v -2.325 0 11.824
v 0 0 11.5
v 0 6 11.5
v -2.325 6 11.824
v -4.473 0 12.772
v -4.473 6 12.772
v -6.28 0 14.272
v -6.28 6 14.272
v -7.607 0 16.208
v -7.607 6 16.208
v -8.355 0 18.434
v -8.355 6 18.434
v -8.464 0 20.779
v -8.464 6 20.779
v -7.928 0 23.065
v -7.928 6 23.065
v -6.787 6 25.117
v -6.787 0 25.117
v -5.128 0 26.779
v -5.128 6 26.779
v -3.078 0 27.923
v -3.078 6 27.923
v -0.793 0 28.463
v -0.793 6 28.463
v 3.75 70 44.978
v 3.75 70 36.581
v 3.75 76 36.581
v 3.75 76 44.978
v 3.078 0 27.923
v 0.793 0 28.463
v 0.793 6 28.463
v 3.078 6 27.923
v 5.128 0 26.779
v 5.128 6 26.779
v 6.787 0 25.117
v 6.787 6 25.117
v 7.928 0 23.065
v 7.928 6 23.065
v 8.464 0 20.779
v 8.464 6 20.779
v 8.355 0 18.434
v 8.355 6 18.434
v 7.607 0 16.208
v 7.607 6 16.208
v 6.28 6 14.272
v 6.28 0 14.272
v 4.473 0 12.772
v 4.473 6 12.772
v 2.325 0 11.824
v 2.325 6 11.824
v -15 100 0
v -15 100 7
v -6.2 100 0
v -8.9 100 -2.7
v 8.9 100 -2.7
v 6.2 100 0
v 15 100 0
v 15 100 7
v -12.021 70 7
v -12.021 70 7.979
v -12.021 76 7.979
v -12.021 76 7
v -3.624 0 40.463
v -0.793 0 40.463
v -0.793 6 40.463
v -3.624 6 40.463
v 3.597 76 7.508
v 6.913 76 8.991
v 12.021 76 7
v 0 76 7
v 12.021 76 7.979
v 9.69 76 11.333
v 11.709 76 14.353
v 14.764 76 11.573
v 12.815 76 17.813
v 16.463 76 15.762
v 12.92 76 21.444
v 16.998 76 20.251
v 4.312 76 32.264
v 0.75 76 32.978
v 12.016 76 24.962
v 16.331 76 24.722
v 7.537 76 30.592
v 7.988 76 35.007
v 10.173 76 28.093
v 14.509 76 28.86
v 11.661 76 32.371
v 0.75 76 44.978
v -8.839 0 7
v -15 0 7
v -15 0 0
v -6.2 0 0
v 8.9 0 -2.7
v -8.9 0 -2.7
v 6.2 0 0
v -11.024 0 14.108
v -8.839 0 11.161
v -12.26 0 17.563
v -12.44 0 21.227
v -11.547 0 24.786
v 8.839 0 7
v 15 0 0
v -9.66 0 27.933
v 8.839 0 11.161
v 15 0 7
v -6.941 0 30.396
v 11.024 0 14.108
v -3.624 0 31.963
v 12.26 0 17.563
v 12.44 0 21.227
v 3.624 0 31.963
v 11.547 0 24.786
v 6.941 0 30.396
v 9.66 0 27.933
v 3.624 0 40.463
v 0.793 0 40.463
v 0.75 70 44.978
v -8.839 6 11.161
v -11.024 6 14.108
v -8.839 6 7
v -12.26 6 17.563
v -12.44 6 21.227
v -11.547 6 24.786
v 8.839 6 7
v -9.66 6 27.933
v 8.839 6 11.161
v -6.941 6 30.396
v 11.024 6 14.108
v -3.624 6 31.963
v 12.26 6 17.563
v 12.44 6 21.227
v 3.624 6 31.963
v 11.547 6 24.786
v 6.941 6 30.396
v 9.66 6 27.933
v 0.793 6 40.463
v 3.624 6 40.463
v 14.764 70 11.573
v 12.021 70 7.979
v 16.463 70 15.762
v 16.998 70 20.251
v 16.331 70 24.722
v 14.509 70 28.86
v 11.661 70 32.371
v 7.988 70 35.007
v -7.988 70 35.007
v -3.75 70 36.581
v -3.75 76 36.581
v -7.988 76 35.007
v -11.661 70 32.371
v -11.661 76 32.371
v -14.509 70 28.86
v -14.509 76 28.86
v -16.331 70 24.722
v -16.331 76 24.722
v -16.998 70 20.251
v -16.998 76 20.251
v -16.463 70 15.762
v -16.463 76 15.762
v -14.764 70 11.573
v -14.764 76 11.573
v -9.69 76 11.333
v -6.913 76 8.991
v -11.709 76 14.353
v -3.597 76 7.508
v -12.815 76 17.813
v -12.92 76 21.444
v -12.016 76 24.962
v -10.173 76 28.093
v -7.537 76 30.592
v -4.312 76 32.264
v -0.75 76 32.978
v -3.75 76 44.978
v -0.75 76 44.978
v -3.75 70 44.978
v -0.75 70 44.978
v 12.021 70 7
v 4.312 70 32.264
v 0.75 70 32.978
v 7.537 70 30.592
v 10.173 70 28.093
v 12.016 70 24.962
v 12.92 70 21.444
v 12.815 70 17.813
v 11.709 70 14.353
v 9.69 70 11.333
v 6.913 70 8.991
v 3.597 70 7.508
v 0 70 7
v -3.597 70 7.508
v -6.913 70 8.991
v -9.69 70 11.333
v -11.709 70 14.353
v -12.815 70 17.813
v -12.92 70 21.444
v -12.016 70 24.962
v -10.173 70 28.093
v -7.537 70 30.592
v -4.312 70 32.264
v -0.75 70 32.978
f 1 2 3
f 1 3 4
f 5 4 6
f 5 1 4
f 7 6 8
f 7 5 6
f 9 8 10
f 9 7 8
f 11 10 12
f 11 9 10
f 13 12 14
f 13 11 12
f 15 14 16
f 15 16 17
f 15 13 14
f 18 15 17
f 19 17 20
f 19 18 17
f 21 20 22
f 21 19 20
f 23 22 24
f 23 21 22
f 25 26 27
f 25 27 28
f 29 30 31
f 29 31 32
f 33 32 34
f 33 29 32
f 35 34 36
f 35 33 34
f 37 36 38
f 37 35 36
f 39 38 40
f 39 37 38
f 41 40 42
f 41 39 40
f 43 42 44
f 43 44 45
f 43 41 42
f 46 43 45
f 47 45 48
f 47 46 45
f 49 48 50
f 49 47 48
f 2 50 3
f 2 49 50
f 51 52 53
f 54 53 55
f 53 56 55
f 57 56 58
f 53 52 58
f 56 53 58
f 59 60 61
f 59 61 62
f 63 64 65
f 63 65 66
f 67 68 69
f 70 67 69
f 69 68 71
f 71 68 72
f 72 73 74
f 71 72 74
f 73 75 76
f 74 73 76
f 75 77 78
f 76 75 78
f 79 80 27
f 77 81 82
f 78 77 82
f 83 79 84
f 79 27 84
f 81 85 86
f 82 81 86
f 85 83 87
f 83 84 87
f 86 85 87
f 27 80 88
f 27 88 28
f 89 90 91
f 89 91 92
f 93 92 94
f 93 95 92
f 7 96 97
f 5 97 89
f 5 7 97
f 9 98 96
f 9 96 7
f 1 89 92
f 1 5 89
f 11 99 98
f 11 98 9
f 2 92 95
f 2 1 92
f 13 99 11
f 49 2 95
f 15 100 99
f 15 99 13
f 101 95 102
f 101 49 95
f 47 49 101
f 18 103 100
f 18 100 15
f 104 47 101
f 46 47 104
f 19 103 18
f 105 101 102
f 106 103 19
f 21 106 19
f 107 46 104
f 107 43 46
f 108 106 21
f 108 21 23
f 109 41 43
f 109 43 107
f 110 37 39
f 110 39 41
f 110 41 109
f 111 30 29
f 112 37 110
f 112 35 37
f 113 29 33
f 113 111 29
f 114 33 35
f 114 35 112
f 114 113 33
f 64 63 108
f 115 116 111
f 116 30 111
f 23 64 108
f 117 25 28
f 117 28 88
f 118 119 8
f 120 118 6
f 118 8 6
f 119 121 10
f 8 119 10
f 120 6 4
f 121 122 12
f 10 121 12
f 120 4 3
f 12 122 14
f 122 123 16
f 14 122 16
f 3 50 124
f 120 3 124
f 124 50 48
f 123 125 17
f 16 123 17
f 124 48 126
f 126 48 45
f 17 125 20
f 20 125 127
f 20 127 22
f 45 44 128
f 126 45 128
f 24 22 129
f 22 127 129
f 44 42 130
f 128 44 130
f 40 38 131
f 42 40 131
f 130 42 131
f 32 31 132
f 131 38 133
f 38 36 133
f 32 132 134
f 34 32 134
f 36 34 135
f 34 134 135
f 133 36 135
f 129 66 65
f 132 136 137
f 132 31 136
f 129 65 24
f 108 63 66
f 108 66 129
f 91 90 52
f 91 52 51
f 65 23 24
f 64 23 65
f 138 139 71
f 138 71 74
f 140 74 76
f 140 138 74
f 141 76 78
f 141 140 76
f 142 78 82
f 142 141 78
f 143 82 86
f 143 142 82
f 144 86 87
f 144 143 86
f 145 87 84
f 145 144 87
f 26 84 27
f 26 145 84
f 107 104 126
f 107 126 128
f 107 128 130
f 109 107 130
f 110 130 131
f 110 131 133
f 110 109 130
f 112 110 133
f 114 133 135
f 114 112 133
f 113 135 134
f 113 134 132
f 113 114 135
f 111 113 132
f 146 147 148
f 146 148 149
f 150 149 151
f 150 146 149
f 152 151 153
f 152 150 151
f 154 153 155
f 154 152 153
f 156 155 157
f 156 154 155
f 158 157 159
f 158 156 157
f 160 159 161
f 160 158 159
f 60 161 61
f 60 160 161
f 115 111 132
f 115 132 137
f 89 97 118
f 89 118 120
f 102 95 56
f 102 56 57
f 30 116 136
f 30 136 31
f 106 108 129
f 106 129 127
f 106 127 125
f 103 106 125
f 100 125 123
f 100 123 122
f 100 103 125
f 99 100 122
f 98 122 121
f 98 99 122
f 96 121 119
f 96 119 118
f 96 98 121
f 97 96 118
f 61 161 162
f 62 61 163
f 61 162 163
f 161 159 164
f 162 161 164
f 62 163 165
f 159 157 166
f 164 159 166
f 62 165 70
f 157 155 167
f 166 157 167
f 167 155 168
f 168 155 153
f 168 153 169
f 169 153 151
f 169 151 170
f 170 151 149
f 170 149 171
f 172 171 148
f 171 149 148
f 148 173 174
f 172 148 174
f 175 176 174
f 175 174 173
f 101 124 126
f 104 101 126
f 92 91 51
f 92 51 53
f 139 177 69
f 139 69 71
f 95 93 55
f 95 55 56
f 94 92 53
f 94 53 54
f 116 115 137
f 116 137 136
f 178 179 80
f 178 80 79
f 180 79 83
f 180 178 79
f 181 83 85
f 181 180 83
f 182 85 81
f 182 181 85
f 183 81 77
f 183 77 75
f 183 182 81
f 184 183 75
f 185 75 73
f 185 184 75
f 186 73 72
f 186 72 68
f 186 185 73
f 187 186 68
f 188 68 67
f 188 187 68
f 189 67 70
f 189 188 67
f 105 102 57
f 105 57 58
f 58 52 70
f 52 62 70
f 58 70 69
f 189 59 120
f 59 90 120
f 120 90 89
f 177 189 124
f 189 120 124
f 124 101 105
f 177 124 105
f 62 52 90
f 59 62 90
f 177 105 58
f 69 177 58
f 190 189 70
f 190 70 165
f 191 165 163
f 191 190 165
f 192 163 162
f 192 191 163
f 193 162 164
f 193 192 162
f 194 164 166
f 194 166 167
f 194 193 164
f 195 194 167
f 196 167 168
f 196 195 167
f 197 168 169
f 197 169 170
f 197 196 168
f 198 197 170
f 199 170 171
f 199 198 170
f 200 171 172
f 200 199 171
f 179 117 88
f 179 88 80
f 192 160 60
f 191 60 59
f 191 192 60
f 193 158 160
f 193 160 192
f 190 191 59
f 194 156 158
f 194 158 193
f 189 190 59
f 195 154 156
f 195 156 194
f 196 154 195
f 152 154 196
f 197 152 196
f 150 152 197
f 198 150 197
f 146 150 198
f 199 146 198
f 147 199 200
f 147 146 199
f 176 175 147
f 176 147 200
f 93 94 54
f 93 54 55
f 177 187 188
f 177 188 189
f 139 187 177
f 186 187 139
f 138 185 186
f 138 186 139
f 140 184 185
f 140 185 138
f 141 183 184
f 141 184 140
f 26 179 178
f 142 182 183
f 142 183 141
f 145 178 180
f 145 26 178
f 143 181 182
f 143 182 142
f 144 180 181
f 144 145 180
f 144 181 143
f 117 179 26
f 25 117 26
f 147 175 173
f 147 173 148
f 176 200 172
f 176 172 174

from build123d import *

# Parameters (mm, degrees)
F2_DEPTH = 100
F3_DEPTH = 76
F4_DEPTH = 70
F5_DEPTH = 6
F7_DEPTH = 12.5


with BuildPart() as f2:
    # F0 (on Front) → F2 (new body)
    with BuildSketch(Plane.XZ):
        Polygon((-6.2, 0), (0, 0), (6.2, 0), (15, 0), (15, 7), (8.8388347648, 7), (0, 7), (-8.8388347648, 7), (-15, 7), (-15, 0), align=None)
        Polygon((0, -2.7), (0, 0), (-6.2, 0), (-8.9, -2.7), align=None)
        Polygon((6.2, 0), (0, 0), (0, -2.7), (8.9, -2.7), align=None)
    extrude(amount=-F2_DEPTH)

    # F1 (on Front) → F3 (join)
    with BuildSketch(Plane.XZ):
        with BuildLine():
            ThreePointArc((0, 7), (-12.9945857106, 19.6248437535), (-0.75, 32.9783473524))
            Line((-0.75, 32.9783473524), (-0.75, 44.9783473524))
            Line((-0.75, 44.9783473524), (-3.75, 44.9783473524))
            Line((-3.75, 44.9783473524), (-3.75, 36.5812393988))
            ThreePointArc((-3.75, 36.5812393988), (-16.3309227117, 24.7223895842), (-12.0208152802, 7.9791847198))
            Line((-12.0208152802, 7.9791847198), (-12.0208152802, 7))
            Line((-12.0208152802, 7), (0, 7))
        make_face()
        with BuildLine():
            ThreePointArc((0.75, 32.9783473524), (12.9945857106, 19.6248437535), (0, 7))
            Line((0, 7), (12.0208152802, 7))
            Line((12.0208152802, 7), (12.0208152802, 7.9791847198))
            ThreePointArc((12.0208152802, 7.9791847198), (16.3309227117, 24.7223895842), (3.75, 36.5812393988))
            Line((3.75, 36.5812393988), (3.75, 44.9783473524))
            Line((3.75, 44.9783473524), (0.75, 44.9783473524))
            Line((0.75, 44.9783473524), (0.75, 32.9783473524))
        make_face()
    extrude(amount=-F3_DEPTH)

    # F1 (on Front) → F4 (cut)
    with BuildSketch(Plane.XZ):
        with BuildLine():
            ThreePointArc((0, 7), (-12.9945857106, 19.6248437535), (-0.75, 32.9783473524))
            Line((-0.75, 32.9783473524), (-0.75, 44.9783473524))
            Line((-0.75, 44.9783473524), (-3.75, 44.9783473524))
            Line((-3.75, 44.9783473524), (-3.75, 36.5812393988))
            ThreePointArc((-3.75, 36.5812393988), (-16.3309227117, 24.7223895842), (-12.0208152802, 7.9791847198))
            Line((-12.0208152802, 7.9791847198), (-12.0208152802, 7))
            Line((-12.0208152802, 7), (0, 7))
        make_face()
        with BuildLine():
            ThreePointArc((0.75, 32.9783473524), (12.9945857106, 19.6248437535), (0, 7))
            Line((0, 7), (12.0208152802, 7))
            Line((12.0208152802, 7), (12.0208152802, 7.9791847198))
            ThreePointArc((12.0208152802, 7.9791847198), (16.3309227117, 24.7223895842), (3.75, 36.5812393988))
            Line((3.75, 36.5812393988), (3.75, 44.9783473524))
            Line((3.75, 44.9783473524), (0.75, 44.9783473524))
            Line((0.75, 44.9783473524), (0.75, 32.9783473524))
        make_face()
    extrude(amount=-F4_DEPTH, mode=Mode.SUBTRACT)

    # F0 (on Front) → F5 (join)
    with BuildSketch(Plane.XZ):
        with BuildLine():
            Line((-8.8388347648, 11.1611652352), (-8.8388347648, 7))
            Line((-8.8388347648, 7), (0, 7))
            Line((0, 7), (0, 11.5))
            ThreePointArc((0, 11.5), (-8.4907228952, 19.602980205), (-0.7931729561, 28.4629118311))
            Line((-0.7931729561, 28.4629118311), (-0.7931729561, 40.4629118311))
            Line((-0.7931729561, 40.4629118311), (-3.624006873, 40.4629118311))
            Line((-3.624006873, 40.4629118311), (-3.624006873, 31.9631339617))
            ThreePointArc((-3.624006873, 31.9631339617), (-12.1248126232, 23.0395589899), (-8.8388347648, 11.1611652352))
        make_face()
        with BuildLine():
            Line((0, 7), (8.8388347648, 7))
            Line((8.8388347648, 7), (8.8388347648, 11.1611652352))
            ThreePointArc((8.8388347648, 11.1611652352), (12.1248126232, 23.0395589899), (3.624006873, 31.9631339617))
            Line((3.624006873, 31.9631339617), (3.624006873, 40.4629118311))
            Line((3.624006873, 40.4629118311), (0.7931729561, 40.4629118311))
            Line((0.7931729561, 40.4629118311), (0.7931729561, 28.4629118311))
            ThreePointArc((0.7931729561, 28.4629118311), (8.4907228952, 19.602980205), (0, 11.5))
            Line((0, 11.5), (0, 7))
        make_face()
    extrude(amount=-F5_DEPTH)

    # F6 (on Right) → F7 (cut, symmetric)
    with BuildSketch(Plane.YZ):
        with BuildLine():
            ThreePointArc((73, 60.07835), (71.5, 58.57835), (73, 57.07835))
            Line((73, 57.07835), (73, 58.57835))
            Line((73, 58.57835), (73, 60.07835))
        make_face()
        with BuildLine():
            Line((73, 58.57835), (73, 57.07835))
            ThreePointArc((73, 57.07835), (74.0606601718, 57.5176898282), (74.5, 58.57835))
            ThreePointArc((74.5, 58.57835), (74.0606601718, 59.6390101718), (73, 60.07835))
            Line((73, 60.07835), (73, 58.57835))
        make_face()
        with BuildLine():
            ThreePointArc((4.5, 54.06291), (4.0606601718, 55.1235701718), (3, 55.56291))
            ThreePointArc((3, 55.56291), (1.9393398282, 53.0022498282), (4.5, 54.06291))
        make_face()
    extrude(amount=F7_DEPTH, both=True, mode=Mode.SUBTRACT)


solid = f2.part
